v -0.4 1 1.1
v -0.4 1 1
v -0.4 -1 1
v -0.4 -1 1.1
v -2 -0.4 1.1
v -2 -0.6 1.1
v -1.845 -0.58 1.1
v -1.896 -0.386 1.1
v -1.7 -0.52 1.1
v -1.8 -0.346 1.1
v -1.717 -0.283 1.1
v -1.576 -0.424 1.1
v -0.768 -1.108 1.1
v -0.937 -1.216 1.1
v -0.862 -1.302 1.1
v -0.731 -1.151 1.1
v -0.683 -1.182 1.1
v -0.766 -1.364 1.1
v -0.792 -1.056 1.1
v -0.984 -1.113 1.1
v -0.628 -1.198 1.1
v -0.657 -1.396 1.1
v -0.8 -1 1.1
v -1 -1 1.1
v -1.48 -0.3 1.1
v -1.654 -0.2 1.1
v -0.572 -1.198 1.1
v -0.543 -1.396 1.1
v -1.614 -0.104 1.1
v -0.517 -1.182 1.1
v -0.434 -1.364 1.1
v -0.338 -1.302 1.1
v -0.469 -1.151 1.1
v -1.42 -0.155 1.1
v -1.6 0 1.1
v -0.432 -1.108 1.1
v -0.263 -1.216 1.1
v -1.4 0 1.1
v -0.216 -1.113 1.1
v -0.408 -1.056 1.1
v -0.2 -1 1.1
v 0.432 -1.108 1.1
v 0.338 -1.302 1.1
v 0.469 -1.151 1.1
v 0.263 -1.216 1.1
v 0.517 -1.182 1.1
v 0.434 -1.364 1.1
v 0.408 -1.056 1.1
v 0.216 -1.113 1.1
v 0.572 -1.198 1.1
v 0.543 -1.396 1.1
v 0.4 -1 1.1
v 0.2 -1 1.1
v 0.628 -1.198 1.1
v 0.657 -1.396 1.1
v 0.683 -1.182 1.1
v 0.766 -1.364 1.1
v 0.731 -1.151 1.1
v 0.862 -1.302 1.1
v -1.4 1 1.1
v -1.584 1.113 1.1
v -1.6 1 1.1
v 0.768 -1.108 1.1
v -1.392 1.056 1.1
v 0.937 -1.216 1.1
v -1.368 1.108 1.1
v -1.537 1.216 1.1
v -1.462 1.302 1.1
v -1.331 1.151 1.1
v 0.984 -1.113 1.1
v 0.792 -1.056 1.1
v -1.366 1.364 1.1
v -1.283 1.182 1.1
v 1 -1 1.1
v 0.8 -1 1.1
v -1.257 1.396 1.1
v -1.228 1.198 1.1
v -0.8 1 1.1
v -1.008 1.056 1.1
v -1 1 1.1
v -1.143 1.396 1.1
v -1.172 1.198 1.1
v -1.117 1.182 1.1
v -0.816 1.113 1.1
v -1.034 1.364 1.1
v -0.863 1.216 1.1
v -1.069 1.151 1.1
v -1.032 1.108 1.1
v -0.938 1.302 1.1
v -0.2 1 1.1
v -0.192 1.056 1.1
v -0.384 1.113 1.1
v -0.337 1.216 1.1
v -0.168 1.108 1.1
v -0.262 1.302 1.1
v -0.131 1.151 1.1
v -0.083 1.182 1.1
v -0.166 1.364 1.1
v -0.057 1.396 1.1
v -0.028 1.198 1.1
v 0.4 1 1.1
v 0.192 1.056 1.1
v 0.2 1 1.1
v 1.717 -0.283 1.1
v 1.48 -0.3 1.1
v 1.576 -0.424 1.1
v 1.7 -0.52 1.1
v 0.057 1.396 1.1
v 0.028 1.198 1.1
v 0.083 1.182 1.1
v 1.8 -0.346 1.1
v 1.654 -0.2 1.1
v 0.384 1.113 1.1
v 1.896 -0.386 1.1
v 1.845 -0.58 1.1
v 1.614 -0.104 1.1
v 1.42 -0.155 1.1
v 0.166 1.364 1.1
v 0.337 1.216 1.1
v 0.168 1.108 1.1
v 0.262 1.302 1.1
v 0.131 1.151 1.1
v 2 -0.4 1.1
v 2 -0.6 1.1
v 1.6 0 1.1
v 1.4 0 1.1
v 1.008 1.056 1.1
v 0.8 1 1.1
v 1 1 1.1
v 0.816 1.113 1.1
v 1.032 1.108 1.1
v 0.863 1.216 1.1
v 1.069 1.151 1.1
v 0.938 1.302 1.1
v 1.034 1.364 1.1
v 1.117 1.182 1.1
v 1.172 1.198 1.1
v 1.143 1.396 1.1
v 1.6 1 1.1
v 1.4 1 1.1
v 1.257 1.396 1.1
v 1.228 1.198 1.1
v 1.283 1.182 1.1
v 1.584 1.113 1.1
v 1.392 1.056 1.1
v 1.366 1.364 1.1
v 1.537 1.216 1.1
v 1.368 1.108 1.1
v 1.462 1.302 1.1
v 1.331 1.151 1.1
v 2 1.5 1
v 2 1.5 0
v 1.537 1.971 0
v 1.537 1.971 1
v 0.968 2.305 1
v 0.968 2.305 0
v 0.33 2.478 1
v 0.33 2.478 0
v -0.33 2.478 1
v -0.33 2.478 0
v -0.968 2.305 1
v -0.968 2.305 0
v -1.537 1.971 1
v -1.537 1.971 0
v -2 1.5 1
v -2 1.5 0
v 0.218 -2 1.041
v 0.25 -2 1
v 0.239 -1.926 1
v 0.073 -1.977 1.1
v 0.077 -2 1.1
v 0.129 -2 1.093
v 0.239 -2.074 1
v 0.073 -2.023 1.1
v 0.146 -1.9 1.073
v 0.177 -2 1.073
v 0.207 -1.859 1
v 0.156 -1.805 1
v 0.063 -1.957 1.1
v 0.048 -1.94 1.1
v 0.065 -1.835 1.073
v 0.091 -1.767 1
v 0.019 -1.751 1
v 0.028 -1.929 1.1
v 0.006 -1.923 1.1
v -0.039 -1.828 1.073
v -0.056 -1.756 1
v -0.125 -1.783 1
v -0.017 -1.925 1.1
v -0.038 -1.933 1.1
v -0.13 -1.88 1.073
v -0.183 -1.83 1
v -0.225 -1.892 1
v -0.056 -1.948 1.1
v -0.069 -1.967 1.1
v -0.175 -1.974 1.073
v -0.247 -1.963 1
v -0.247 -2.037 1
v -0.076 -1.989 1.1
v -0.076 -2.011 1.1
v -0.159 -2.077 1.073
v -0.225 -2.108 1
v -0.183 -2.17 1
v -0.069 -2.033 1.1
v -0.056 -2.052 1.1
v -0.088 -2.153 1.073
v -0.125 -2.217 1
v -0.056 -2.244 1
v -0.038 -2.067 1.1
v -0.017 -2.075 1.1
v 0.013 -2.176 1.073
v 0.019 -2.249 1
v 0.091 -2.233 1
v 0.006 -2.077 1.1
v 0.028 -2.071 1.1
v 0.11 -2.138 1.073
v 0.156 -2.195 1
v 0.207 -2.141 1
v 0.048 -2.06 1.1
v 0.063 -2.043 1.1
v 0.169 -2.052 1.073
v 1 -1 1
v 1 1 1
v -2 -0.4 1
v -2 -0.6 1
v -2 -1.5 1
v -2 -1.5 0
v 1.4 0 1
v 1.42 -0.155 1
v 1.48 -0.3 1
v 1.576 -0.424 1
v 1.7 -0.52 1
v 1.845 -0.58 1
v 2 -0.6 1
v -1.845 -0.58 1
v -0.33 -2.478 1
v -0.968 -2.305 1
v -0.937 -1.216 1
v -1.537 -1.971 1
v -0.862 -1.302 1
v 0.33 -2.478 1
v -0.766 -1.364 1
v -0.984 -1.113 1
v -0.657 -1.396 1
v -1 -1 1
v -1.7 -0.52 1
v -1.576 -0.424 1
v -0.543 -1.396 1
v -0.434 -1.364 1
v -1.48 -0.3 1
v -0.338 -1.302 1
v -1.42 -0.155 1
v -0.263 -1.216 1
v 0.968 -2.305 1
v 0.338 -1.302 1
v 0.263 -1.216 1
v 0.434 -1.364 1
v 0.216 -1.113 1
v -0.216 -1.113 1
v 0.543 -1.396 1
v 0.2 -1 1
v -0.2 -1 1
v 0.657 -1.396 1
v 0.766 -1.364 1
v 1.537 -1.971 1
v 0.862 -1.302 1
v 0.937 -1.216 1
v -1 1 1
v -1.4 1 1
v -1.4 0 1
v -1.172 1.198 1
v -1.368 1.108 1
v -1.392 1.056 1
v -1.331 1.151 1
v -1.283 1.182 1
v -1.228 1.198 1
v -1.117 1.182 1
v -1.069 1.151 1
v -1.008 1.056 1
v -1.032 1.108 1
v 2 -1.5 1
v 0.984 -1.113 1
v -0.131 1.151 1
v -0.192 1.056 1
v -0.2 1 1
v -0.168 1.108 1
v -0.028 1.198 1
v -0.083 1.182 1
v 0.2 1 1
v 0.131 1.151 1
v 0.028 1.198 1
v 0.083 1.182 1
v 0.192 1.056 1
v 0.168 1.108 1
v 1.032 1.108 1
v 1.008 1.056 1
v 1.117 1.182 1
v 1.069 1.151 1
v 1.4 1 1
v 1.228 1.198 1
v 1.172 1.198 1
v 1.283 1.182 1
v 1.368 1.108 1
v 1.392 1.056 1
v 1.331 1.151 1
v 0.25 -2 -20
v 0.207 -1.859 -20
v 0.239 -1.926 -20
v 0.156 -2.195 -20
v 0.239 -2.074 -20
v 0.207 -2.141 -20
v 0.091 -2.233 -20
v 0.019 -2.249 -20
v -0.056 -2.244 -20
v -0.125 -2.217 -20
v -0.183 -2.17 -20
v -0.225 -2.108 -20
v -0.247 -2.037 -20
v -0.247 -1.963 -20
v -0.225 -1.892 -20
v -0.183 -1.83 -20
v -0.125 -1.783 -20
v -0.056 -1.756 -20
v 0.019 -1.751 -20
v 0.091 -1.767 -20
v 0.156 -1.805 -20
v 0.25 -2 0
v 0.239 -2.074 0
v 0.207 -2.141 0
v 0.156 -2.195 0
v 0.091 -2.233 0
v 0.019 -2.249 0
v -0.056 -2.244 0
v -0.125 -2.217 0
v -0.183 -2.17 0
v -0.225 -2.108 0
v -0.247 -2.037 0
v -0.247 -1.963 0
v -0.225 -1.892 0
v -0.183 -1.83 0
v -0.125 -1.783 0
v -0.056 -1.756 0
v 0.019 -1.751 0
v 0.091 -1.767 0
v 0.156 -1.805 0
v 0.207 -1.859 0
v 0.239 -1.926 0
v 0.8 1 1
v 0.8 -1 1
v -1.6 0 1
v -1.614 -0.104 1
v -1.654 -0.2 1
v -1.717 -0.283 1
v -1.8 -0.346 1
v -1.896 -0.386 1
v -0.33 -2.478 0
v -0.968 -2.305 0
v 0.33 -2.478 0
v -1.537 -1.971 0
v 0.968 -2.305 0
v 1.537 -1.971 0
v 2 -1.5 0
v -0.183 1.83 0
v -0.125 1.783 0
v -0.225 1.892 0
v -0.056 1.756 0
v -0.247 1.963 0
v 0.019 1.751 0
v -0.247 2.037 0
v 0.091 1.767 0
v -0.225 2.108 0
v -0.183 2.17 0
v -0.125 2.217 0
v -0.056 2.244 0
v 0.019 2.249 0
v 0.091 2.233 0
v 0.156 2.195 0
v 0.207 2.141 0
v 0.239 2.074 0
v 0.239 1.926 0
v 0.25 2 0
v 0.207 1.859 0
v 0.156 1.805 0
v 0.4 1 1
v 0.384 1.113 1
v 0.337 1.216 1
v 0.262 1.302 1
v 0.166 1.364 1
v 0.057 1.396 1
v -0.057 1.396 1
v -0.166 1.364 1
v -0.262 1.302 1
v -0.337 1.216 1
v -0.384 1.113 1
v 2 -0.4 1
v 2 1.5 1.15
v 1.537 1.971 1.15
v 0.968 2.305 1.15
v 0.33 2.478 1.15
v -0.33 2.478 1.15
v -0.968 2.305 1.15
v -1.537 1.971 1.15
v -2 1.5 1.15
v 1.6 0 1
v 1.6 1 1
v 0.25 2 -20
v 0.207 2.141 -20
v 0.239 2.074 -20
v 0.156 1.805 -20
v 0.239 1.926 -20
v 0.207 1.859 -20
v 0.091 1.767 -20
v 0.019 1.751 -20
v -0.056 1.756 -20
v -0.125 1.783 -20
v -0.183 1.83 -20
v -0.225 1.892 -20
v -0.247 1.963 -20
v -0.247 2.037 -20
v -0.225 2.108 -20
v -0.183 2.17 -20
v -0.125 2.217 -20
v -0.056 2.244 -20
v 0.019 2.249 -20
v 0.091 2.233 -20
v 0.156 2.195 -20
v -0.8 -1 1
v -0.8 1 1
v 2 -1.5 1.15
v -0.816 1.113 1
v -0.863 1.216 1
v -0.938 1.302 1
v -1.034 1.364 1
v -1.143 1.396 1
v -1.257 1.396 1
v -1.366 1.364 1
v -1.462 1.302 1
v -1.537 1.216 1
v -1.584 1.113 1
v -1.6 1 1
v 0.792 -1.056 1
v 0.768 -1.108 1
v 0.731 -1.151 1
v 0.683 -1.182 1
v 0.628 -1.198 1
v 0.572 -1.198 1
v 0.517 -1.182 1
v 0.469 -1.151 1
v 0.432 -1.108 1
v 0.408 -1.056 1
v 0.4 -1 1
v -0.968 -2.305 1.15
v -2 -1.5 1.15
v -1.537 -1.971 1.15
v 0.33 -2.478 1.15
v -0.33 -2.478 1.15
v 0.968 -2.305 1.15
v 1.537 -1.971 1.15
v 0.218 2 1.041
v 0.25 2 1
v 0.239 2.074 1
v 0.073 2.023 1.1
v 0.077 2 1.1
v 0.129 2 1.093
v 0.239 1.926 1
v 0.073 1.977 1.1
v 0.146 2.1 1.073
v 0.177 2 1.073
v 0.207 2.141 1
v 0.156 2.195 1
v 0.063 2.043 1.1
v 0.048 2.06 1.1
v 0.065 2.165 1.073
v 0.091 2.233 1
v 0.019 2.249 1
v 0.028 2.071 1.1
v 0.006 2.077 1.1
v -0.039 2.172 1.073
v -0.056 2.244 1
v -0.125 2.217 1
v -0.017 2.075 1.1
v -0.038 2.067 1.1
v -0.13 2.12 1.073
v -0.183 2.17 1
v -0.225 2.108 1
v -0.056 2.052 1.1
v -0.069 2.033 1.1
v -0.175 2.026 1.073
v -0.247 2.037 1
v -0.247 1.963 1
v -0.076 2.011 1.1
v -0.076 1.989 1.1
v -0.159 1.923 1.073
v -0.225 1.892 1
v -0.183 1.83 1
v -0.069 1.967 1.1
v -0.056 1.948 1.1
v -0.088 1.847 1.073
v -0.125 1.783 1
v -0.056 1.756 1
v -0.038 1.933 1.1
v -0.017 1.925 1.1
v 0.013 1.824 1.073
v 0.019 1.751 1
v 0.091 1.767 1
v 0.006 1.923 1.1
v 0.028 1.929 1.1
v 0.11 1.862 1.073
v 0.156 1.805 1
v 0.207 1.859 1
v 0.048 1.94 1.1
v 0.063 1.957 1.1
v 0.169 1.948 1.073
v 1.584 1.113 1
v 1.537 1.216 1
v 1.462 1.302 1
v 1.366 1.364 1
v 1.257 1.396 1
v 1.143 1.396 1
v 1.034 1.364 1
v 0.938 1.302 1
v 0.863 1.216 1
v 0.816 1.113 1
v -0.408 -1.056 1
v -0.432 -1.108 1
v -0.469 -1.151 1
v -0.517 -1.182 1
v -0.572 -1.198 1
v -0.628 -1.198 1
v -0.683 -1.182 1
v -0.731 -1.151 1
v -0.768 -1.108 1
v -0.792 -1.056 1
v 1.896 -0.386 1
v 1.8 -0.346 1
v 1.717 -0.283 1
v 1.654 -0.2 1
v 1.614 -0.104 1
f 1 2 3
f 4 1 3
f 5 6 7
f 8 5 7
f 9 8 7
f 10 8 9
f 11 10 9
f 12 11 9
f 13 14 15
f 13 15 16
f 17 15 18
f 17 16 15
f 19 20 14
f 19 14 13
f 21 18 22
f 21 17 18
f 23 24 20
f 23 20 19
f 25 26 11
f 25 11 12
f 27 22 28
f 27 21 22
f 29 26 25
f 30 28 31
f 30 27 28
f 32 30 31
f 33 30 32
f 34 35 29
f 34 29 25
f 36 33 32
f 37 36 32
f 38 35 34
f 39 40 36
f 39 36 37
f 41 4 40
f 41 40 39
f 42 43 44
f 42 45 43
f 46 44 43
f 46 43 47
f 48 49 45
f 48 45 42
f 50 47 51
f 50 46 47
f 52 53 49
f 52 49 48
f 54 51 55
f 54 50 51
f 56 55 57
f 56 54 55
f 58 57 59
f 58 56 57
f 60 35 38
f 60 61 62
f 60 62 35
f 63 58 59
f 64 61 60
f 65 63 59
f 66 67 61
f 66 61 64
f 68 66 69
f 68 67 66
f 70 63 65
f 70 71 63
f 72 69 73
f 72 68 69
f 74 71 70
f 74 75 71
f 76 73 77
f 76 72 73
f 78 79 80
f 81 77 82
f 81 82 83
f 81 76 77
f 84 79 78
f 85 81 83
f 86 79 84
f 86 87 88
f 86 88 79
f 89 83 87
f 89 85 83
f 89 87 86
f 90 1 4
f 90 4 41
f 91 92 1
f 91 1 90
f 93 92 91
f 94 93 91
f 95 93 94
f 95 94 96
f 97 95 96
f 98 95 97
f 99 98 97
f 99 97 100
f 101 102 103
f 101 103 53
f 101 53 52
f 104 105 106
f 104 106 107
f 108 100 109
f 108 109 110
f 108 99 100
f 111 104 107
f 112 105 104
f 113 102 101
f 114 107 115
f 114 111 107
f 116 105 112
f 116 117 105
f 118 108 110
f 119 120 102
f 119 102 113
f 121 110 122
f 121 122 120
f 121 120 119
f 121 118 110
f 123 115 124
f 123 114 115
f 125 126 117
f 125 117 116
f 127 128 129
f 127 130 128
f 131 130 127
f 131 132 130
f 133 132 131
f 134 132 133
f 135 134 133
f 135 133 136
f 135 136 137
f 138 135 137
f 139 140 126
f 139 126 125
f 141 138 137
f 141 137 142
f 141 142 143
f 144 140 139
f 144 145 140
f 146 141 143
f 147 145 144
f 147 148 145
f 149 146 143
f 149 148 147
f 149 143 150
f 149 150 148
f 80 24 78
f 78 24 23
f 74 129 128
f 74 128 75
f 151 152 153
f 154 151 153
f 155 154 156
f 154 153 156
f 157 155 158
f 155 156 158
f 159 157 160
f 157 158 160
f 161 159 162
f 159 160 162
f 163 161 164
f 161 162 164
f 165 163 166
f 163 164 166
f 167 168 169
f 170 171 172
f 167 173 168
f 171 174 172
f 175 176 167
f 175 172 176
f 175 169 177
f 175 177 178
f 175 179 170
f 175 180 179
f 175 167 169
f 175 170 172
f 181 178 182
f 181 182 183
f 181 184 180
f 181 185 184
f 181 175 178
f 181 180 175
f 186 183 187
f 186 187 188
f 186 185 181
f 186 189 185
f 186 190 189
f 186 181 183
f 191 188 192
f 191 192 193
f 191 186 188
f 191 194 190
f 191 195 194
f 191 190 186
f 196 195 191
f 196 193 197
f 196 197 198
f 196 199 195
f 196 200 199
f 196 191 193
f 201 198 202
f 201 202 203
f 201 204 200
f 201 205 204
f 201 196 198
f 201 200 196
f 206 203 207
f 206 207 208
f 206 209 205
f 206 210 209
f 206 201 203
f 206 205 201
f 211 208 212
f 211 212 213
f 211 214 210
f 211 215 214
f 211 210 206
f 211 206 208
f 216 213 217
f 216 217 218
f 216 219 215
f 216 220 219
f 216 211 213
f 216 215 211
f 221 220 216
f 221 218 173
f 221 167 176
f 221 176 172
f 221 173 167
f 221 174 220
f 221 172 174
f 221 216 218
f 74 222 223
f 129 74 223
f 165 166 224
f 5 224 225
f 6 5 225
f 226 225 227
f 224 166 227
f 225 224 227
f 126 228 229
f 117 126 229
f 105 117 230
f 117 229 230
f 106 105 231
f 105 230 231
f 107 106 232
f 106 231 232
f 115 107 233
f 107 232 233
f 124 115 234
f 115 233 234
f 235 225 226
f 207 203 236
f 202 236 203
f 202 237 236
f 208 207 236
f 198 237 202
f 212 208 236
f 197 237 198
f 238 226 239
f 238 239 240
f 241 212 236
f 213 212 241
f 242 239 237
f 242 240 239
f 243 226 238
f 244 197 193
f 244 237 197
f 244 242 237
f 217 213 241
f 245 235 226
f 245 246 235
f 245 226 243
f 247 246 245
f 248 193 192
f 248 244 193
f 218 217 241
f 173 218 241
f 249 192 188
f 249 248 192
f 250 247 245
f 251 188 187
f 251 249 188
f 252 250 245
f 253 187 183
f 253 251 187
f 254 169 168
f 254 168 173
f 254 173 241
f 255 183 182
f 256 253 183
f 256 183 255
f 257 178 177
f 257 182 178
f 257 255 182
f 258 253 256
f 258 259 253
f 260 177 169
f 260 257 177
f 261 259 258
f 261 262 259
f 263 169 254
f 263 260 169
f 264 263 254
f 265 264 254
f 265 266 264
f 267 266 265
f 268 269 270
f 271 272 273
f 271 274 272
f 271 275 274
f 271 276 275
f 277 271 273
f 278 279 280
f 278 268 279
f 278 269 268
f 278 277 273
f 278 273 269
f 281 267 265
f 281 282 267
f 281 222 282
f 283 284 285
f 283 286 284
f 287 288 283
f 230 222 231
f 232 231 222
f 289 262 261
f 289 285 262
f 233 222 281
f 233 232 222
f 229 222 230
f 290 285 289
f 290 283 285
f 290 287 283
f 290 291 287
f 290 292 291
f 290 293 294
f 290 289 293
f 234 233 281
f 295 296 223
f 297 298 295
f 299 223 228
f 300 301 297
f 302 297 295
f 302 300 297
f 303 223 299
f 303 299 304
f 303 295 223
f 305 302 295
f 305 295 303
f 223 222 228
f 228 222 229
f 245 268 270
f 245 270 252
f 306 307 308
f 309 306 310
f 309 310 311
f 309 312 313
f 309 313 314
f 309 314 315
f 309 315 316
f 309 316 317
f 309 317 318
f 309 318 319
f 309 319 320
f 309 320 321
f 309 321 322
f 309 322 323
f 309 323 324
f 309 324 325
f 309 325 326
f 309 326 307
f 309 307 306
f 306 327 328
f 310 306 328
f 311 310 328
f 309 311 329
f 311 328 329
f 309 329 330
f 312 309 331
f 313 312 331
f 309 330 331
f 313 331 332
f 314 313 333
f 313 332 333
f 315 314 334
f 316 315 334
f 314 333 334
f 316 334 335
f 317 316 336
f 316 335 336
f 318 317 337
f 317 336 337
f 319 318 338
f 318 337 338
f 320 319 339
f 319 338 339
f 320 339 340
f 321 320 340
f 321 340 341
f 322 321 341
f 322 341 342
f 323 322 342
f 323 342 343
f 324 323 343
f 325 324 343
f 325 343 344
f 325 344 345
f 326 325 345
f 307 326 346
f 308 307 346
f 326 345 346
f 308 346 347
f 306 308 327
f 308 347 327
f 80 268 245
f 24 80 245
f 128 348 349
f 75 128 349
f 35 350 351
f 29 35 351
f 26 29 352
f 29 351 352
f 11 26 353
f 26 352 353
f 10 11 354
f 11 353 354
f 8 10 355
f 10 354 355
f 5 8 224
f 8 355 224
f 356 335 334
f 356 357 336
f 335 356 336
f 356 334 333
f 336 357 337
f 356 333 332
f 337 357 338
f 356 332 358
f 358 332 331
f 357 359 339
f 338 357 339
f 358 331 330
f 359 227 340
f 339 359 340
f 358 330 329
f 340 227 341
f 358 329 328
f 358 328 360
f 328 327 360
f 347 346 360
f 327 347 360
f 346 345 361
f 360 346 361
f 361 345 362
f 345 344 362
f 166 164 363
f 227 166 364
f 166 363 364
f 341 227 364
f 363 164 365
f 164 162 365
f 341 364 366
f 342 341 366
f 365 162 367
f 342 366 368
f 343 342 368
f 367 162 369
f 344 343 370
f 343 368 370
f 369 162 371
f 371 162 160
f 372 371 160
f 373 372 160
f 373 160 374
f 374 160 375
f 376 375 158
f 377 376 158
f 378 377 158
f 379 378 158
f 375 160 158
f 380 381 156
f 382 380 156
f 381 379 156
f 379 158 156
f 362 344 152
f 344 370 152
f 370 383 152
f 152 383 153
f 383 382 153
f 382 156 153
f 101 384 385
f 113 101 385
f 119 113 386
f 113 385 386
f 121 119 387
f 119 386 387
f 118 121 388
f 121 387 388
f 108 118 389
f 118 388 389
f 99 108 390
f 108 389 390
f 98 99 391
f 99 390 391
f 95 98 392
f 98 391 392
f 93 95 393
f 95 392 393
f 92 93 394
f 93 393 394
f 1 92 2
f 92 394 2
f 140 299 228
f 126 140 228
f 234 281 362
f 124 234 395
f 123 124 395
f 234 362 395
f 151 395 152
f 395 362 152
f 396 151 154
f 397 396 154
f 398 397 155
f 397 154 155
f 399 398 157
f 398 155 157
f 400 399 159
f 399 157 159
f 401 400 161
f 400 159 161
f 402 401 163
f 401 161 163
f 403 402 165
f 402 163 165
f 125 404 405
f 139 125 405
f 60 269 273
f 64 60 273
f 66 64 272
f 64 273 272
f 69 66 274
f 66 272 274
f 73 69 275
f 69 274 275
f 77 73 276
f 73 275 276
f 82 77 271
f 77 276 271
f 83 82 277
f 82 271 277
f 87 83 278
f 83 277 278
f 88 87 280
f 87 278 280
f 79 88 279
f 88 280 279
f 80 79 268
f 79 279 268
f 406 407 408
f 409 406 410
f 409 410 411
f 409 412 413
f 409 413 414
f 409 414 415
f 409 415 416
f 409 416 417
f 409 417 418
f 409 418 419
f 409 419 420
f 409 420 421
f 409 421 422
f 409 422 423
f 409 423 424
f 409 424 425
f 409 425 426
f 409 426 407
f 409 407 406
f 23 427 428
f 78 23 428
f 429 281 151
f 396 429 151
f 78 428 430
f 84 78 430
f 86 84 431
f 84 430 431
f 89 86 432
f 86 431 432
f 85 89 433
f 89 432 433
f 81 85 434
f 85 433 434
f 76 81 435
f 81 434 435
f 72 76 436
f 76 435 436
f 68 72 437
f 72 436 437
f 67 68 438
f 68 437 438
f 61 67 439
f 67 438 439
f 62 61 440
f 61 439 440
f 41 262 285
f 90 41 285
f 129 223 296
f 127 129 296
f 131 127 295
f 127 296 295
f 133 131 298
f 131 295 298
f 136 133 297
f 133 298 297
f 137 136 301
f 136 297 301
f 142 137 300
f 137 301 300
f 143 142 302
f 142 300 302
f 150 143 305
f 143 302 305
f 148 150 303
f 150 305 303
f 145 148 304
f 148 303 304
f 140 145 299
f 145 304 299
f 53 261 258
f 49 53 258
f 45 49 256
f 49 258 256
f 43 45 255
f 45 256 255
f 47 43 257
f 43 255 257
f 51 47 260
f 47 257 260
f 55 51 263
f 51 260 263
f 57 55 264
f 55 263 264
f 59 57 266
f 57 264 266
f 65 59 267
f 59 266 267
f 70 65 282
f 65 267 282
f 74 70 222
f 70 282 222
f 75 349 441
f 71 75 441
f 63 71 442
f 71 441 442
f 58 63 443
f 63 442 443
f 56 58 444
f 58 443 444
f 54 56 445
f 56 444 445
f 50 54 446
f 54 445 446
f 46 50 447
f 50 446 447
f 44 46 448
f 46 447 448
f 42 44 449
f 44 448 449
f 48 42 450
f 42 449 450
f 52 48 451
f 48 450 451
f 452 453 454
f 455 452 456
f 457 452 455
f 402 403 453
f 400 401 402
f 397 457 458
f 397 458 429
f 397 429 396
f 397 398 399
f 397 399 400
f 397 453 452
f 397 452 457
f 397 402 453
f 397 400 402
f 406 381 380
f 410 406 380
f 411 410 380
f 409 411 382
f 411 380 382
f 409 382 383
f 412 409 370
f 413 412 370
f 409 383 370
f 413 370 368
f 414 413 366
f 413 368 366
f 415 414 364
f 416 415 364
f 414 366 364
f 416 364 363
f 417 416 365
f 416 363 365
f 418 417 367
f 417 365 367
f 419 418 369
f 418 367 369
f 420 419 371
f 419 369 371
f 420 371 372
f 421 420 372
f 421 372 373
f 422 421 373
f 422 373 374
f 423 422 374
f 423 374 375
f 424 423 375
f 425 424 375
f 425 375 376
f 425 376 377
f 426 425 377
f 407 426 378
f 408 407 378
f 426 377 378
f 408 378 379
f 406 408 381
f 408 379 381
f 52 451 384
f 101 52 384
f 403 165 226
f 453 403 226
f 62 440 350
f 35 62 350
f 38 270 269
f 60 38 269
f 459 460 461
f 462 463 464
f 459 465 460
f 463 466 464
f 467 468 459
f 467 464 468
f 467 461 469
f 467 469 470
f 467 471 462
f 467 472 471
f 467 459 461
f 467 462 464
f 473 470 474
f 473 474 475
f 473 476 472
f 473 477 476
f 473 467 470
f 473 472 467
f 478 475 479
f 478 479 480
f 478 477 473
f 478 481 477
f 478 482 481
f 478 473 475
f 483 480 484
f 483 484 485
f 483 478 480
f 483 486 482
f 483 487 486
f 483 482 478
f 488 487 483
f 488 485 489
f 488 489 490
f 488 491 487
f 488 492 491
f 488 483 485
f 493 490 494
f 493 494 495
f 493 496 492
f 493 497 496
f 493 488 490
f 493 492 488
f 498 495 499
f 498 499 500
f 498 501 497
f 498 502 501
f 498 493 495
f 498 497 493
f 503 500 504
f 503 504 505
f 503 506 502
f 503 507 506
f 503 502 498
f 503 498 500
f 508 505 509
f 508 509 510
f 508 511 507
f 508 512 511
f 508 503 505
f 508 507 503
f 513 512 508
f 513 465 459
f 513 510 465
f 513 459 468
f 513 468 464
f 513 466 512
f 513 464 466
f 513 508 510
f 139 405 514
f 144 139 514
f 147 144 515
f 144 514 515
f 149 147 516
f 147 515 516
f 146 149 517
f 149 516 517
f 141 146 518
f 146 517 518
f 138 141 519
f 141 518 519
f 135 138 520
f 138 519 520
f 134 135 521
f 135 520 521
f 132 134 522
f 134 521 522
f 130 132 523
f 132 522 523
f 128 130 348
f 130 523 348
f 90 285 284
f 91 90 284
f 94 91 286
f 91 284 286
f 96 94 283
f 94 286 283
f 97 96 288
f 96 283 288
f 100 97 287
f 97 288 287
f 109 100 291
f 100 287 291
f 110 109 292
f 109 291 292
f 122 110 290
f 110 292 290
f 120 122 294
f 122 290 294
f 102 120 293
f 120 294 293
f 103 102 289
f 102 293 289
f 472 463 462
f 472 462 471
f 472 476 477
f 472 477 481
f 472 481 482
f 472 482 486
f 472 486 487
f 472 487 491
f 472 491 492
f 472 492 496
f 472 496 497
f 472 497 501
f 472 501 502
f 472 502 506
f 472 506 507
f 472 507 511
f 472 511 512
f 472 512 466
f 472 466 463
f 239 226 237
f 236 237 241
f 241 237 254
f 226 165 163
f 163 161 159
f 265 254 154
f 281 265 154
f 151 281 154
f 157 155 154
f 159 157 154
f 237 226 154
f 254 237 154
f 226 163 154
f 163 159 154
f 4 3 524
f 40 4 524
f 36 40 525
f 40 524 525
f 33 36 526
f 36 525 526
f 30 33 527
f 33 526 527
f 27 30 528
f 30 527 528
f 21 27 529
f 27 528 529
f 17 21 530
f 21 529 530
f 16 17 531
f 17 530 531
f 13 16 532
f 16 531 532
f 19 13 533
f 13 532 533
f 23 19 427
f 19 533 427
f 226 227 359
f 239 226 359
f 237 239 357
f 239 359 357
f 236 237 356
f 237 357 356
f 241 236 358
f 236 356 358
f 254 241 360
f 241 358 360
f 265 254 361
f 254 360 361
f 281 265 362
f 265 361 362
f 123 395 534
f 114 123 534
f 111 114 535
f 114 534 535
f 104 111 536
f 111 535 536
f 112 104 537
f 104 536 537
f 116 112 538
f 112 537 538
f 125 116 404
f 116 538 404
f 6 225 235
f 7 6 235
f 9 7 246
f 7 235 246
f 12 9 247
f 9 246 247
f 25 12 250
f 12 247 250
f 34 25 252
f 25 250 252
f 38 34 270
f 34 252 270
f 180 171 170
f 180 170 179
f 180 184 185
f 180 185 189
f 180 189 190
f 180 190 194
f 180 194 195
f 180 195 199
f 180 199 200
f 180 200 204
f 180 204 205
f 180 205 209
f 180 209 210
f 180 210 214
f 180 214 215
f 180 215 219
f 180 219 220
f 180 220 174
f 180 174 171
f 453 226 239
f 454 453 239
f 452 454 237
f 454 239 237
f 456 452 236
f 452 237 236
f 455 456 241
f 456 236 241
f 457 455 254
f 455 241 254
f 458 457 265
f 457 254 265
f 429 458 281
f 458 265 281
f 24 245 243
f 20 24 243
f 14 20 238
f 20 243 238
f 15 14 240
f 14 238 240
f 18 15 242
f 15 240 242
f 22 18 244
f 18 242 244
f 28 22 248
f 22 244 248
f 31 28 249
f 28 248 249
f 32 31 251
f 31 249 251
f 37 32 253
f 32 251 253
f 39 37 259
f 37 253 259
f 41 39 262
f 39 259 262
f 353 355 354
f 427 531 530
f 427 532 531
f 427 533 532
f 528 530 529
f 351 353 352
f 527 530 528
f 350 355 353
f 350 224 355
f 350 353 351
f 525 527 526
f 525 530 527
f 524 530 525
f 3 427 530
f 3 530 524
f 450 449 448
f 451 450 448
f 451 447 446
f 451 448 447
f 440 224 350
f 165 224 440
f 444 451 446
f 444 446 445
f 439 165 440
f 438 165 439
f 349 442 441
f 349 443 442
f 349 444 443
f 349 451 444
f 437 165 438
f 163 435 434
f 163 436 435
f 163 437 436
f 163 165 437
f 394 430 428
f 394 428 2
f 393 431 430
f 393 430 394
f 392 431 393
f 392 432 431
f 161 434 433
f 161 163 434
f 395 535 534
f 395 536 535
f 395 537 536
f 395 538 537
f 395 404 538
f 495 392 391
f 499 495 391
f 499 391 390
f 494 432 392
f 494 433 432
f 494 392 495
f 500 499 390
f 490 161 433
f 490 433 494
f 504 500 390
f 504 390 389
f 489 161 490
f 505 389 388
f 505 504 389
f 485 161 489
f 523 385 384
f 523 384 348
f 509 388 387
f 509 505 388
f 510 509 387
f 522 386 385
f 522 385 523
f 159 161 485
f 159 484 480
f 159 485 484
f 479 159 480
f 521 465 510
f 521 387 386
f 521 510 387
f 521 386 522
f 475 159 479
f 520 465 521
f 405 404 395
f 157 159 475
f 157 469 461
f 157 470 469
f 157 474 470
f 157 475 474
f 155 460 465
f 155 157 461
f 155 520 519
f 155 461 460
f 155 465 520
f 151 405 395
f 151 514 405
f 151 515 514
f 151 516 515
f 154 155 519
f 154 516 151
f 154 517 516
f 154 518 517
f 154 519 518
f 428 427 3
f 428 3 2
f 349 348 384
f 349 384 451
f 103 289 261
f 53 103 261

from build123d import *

# Parameters (mm, degrees)
BOSS_EXTRUDE1_DEPTH = 1
SKETCH3_R           = 0.25
BOSS_EXTRUDE2_DEPTH = 0.1
FILLET1_R           = 0.2
BOSS_EXTRUDE3_DEPTH = 0.15
SKETCH5_R           = 0.25
BOSS_EXTRUDE4_DEPTH = 20


with BuildPart() as part:
    # Sketch1 → Boss-Extrude1 (new body)
    with BuildSketch(Plane.XY):
        with BuildLine():
            Line((-2, 1.5), (-2, -1.5))
            ThreePointArc((-2, -1.5), (0, -2.5), (2, -1.5))
            Line((2, -1.5), (2, 1.5))
            ThreePointArc((2, 1.5), (0, 2.5), (-2, 1.5))
        make_face()
    extrude(amount=BOSS_EXTRUDE1_DEPTH)

    # Sketch3 → Boss-Extrude2 (add)
    with BuildSketch(Plane.XY.offset(1)):
        with BuildLine():
            ThreePointArc((0.3, 1), (0, 1.3), (-0.3, 1))
            Line((-0.3, 1), (-0.3, 0))
            Line((-0.3, 0), (-0.3, -1))
            ThreePointArc((-0.3, -1), (-0.6, -1.3), (-0.9, -1))
            Line((-0.9, -1), (-0.9, 1))
            ThreePointArc((-0.9, 1), (-1.2, 1.3), (-1.5, 1))
            Line((-1.5, 1), (-1.5, 0))
            ThreePointArc((-1.5, 0), (-1.646446609, -0.353553391), (-2, -0.5))
            Line((-2, -0.5), (-2, -0.6))
            ThreePointArc((-2, -0.6), (-1.575735931, -0.424264069), (-1.4, 0))
            Line((-1.4, 0), (-1.4, 1))
            ThreePointArc((-1.4, 1), (-1.2, 1.2), (-1, 1))
            Line((-1, 1), (-1, -1))
            ThreePointArc((-1, -1), (-0.6, -1.4), (-0.2, -1))
            Line((-0.2, -1), (-0.2, 0))
            Line((-0.2, 0), (-0.2, 1))
            ThreePointArc((-0.2, 1), (0, 1.2), (0.2, 1))
            Line((0.2, 1), (0.2, 0))
            Line((0.2, 0), (0.2, -1))
            ThreePointArc((0.2, -1), (0.6, -1.4), (1, -1))
            Line((1, -1), (1, 1))
            ThreePointArc((1, 1), (1.2, 1.2), (1.4, 1))
            Line((1.4, 1), (1.4, 0))
            ThreePointArc((1.4, 0), (1.575735931, -0.424264069), (2, -0.6))
            Line((2, -0.6), (2, -0.5))
            ThreePointArc((2, -0.5), (1.646446609, -0.353553391), (1.5, 0))
            Line((1.5, 0), (1.5, 1))
            ThreePointArc((1.5, 1), (1.2, 1.3), (0.9, 1))
            Line((0.9, 1), (0.9, -1))
            ThreePointArc((0.9, -1), (0.6, -1.3), (0.3, -1))
            Line((0.3, -1), (0.3, 0))
            Line((0.3, 0), (0.3, 1))
        make_face()
        with BuildLine():
            Line((-0.3, 0), (-0.3, 1))
            ThreePointArc((-0.3, 1), (0, 1.3), (0.3, 1))
            Line((0.3, 1), (0.3, 0))
            Line((0.3, 0), (0.3, -1))
            ThreePointArc((0.3, -1), (0.6, -1.3), (0.9, -1))
            Line((0.9, -1), (0.9, 1))
            ThreePointArc((0.9, 1), (1.2, 1.3), (1.5, 1))
            Line((1.5, 1), (1.5, 0))
            ThreePointArc((1.5, 0), (1.646446609, -0.353553391), (2, -0.5))
            Line((2, -0.5), (2, -0.4))
            ThreePointArc((2, -0.4), (1.717157288, -0.282842712), (1.6, 0))
            Line((1.6, 0), (1.6, 1))
            ThreePointArc((1.6, 1), (1.2, 1.4), (0.8, 1))
            Line((0.8, 1), (0.8, -1))
            ThreePointArc((0.8, -1), (0.6, -1.2), (0.4, -1))
            Line((0.4, -1), (0.4, 0))
            Line((0.4, 0), (0.4, 1))
            ThreePointArc((0.4, 1), (0, 1.4), (-0.4, 1))
            Line((-0.4, 1), (-0.4, 0))
            Line((-0.4, 0), (-0.4, -1))
            ThreePointArc((-0.4, -1), (-0.6, -1.2), (-0.8, -1))
            Line((-0.8, -1), (-0.8, 1))
            ThreePointArc((-0.8, 1), (-1.2, 1.4), (-1.6, 1))
            Line((-1.6, 1), (-1.6, 0))
            ThreePointArc((-1.6, 0), (-1.717157288, -0.282842712), (-2, -0.4))
            Line((-2, -0.4), (-2, -0.5))
            ThreePointArc((-2, -0.5), (-1.646446609, -0.353553391), (-1.5, 0))
            Line((-1.5, 0), (-1.5, 1))
            ThreePointArc((-1.5, 1), (-1.2, 1.3), (-0.9, 1))
            Line((-0.9, 1), (-0.9, -1))
            ThreePointArc((-0.9, -1), (-0.6, -1.3), (-0.3, -1))
            Line((-0.3, -1), (-0.3, 0))
        make_face()
        with Locations((0, -2)):
            Circle(SKETCH3_R)
        with Locations((0, 2)):
            Circle(SKETCH3_R)
    extrude(amount=BOSS_EXTRUDE2_DEPTH)

    # Fillet1
    # the kernel refuses this fillet: 0.2 mm, written as the material it takes off along each edge
    with BuildSketch(Plane(origin=(0, -2, 1.1), x_dir=(1, 0, 0), z_dir=(0, -1, 0))) as fillet1_piece_1:
        with BuildLine():
            CenterArc((0.076794919, -0.2), FILLET1_R, 30, 60)
            Line((0.076794919, 0), (0.076794919, 0.004))
            Line((0.076794919, 0.004), (0.25, 0.004))
            Line((0.25, 0.004), (0.254, 0))
            ThreePointArc((0.254, 0), (0.254, -0.05), (0.253464102, -0.098))
            Line((0.253464102, -0.098), (0.25, -0.1))
        make_face()
    revolve(axis=Axis((0, -2, 1.1), (0, 0, 1)), mode=Mode.SUBTRACT)
    with BuildSketch(Plane(origin=(0, 2, 1.1), x_dir=(1, 0, 0), z_dir=(0, -1, 0))) as fillet1_piece_2:
        with BuildLine():
            CenterArc((0.076794919, -0.2), FILLET1_R, 30, 60)
            Line((0.076794919, 0), (0.076794919, 0.004))
            Line((0.076794919, 0.004), (0.25, 0.004))
            Line((0.25, 0.004), (0.254, 0))
            ThreePointArc((0.254, 0), (0.254, -0.05), (0.253464102, -0.098))
            Line((0.253464102, -0.098), (0.25, -0.1))
        make_face()
    revolve(axis=Axis((0, 2, 1.1), (0, 0, 1)), mode=Mode.SUBTRACT)

    # Sketch5 → Boss-Extrude4 (add)
    with BuildSketch(Plane(origin=(0, 0, 0), x_dir=(-1, 0, 0), z_dir=(0, 0, -1))):
        with Locations(Location((0, 2, 0), (0, 0, 180))):
            Circle(SKETCH5_R)
        with Locations(Location((0, -2, 0), (0, 0, 180))):
            Circle(SKETCH5_R)
    extrude(amount=BOSS_EXTRUDE4_DEPTH)


with BuildPart() as body_2:
    # Sketch4 → Boss-Extrude3 (new body)
    with BuildSketch(Plane.XY.offset(1)):
        with BuildLine():
            Line((-2, -0.4), (-2, -0.6))
            Line((-2, -0.6), (-2, -1.5))
            ThreePointArc((-2, -1.5), (0, -2.5), (2, -1.5))
            Line((2, -1.5), (2, -0.6))
            Line((2, -0.6), (2, -0.4))
            Line((2, -0.4), (2, 1.5))
            ThreePointArc((2, 1.5), (0, 2.5), (-2, 1.5))
            Line((-2, 1.5), (-2, -0.4))
        make_face()
    extrude(amount=BOSS_EXTRUDE3_DEPTH)


solid = Compound([part.part, body_2.part])
